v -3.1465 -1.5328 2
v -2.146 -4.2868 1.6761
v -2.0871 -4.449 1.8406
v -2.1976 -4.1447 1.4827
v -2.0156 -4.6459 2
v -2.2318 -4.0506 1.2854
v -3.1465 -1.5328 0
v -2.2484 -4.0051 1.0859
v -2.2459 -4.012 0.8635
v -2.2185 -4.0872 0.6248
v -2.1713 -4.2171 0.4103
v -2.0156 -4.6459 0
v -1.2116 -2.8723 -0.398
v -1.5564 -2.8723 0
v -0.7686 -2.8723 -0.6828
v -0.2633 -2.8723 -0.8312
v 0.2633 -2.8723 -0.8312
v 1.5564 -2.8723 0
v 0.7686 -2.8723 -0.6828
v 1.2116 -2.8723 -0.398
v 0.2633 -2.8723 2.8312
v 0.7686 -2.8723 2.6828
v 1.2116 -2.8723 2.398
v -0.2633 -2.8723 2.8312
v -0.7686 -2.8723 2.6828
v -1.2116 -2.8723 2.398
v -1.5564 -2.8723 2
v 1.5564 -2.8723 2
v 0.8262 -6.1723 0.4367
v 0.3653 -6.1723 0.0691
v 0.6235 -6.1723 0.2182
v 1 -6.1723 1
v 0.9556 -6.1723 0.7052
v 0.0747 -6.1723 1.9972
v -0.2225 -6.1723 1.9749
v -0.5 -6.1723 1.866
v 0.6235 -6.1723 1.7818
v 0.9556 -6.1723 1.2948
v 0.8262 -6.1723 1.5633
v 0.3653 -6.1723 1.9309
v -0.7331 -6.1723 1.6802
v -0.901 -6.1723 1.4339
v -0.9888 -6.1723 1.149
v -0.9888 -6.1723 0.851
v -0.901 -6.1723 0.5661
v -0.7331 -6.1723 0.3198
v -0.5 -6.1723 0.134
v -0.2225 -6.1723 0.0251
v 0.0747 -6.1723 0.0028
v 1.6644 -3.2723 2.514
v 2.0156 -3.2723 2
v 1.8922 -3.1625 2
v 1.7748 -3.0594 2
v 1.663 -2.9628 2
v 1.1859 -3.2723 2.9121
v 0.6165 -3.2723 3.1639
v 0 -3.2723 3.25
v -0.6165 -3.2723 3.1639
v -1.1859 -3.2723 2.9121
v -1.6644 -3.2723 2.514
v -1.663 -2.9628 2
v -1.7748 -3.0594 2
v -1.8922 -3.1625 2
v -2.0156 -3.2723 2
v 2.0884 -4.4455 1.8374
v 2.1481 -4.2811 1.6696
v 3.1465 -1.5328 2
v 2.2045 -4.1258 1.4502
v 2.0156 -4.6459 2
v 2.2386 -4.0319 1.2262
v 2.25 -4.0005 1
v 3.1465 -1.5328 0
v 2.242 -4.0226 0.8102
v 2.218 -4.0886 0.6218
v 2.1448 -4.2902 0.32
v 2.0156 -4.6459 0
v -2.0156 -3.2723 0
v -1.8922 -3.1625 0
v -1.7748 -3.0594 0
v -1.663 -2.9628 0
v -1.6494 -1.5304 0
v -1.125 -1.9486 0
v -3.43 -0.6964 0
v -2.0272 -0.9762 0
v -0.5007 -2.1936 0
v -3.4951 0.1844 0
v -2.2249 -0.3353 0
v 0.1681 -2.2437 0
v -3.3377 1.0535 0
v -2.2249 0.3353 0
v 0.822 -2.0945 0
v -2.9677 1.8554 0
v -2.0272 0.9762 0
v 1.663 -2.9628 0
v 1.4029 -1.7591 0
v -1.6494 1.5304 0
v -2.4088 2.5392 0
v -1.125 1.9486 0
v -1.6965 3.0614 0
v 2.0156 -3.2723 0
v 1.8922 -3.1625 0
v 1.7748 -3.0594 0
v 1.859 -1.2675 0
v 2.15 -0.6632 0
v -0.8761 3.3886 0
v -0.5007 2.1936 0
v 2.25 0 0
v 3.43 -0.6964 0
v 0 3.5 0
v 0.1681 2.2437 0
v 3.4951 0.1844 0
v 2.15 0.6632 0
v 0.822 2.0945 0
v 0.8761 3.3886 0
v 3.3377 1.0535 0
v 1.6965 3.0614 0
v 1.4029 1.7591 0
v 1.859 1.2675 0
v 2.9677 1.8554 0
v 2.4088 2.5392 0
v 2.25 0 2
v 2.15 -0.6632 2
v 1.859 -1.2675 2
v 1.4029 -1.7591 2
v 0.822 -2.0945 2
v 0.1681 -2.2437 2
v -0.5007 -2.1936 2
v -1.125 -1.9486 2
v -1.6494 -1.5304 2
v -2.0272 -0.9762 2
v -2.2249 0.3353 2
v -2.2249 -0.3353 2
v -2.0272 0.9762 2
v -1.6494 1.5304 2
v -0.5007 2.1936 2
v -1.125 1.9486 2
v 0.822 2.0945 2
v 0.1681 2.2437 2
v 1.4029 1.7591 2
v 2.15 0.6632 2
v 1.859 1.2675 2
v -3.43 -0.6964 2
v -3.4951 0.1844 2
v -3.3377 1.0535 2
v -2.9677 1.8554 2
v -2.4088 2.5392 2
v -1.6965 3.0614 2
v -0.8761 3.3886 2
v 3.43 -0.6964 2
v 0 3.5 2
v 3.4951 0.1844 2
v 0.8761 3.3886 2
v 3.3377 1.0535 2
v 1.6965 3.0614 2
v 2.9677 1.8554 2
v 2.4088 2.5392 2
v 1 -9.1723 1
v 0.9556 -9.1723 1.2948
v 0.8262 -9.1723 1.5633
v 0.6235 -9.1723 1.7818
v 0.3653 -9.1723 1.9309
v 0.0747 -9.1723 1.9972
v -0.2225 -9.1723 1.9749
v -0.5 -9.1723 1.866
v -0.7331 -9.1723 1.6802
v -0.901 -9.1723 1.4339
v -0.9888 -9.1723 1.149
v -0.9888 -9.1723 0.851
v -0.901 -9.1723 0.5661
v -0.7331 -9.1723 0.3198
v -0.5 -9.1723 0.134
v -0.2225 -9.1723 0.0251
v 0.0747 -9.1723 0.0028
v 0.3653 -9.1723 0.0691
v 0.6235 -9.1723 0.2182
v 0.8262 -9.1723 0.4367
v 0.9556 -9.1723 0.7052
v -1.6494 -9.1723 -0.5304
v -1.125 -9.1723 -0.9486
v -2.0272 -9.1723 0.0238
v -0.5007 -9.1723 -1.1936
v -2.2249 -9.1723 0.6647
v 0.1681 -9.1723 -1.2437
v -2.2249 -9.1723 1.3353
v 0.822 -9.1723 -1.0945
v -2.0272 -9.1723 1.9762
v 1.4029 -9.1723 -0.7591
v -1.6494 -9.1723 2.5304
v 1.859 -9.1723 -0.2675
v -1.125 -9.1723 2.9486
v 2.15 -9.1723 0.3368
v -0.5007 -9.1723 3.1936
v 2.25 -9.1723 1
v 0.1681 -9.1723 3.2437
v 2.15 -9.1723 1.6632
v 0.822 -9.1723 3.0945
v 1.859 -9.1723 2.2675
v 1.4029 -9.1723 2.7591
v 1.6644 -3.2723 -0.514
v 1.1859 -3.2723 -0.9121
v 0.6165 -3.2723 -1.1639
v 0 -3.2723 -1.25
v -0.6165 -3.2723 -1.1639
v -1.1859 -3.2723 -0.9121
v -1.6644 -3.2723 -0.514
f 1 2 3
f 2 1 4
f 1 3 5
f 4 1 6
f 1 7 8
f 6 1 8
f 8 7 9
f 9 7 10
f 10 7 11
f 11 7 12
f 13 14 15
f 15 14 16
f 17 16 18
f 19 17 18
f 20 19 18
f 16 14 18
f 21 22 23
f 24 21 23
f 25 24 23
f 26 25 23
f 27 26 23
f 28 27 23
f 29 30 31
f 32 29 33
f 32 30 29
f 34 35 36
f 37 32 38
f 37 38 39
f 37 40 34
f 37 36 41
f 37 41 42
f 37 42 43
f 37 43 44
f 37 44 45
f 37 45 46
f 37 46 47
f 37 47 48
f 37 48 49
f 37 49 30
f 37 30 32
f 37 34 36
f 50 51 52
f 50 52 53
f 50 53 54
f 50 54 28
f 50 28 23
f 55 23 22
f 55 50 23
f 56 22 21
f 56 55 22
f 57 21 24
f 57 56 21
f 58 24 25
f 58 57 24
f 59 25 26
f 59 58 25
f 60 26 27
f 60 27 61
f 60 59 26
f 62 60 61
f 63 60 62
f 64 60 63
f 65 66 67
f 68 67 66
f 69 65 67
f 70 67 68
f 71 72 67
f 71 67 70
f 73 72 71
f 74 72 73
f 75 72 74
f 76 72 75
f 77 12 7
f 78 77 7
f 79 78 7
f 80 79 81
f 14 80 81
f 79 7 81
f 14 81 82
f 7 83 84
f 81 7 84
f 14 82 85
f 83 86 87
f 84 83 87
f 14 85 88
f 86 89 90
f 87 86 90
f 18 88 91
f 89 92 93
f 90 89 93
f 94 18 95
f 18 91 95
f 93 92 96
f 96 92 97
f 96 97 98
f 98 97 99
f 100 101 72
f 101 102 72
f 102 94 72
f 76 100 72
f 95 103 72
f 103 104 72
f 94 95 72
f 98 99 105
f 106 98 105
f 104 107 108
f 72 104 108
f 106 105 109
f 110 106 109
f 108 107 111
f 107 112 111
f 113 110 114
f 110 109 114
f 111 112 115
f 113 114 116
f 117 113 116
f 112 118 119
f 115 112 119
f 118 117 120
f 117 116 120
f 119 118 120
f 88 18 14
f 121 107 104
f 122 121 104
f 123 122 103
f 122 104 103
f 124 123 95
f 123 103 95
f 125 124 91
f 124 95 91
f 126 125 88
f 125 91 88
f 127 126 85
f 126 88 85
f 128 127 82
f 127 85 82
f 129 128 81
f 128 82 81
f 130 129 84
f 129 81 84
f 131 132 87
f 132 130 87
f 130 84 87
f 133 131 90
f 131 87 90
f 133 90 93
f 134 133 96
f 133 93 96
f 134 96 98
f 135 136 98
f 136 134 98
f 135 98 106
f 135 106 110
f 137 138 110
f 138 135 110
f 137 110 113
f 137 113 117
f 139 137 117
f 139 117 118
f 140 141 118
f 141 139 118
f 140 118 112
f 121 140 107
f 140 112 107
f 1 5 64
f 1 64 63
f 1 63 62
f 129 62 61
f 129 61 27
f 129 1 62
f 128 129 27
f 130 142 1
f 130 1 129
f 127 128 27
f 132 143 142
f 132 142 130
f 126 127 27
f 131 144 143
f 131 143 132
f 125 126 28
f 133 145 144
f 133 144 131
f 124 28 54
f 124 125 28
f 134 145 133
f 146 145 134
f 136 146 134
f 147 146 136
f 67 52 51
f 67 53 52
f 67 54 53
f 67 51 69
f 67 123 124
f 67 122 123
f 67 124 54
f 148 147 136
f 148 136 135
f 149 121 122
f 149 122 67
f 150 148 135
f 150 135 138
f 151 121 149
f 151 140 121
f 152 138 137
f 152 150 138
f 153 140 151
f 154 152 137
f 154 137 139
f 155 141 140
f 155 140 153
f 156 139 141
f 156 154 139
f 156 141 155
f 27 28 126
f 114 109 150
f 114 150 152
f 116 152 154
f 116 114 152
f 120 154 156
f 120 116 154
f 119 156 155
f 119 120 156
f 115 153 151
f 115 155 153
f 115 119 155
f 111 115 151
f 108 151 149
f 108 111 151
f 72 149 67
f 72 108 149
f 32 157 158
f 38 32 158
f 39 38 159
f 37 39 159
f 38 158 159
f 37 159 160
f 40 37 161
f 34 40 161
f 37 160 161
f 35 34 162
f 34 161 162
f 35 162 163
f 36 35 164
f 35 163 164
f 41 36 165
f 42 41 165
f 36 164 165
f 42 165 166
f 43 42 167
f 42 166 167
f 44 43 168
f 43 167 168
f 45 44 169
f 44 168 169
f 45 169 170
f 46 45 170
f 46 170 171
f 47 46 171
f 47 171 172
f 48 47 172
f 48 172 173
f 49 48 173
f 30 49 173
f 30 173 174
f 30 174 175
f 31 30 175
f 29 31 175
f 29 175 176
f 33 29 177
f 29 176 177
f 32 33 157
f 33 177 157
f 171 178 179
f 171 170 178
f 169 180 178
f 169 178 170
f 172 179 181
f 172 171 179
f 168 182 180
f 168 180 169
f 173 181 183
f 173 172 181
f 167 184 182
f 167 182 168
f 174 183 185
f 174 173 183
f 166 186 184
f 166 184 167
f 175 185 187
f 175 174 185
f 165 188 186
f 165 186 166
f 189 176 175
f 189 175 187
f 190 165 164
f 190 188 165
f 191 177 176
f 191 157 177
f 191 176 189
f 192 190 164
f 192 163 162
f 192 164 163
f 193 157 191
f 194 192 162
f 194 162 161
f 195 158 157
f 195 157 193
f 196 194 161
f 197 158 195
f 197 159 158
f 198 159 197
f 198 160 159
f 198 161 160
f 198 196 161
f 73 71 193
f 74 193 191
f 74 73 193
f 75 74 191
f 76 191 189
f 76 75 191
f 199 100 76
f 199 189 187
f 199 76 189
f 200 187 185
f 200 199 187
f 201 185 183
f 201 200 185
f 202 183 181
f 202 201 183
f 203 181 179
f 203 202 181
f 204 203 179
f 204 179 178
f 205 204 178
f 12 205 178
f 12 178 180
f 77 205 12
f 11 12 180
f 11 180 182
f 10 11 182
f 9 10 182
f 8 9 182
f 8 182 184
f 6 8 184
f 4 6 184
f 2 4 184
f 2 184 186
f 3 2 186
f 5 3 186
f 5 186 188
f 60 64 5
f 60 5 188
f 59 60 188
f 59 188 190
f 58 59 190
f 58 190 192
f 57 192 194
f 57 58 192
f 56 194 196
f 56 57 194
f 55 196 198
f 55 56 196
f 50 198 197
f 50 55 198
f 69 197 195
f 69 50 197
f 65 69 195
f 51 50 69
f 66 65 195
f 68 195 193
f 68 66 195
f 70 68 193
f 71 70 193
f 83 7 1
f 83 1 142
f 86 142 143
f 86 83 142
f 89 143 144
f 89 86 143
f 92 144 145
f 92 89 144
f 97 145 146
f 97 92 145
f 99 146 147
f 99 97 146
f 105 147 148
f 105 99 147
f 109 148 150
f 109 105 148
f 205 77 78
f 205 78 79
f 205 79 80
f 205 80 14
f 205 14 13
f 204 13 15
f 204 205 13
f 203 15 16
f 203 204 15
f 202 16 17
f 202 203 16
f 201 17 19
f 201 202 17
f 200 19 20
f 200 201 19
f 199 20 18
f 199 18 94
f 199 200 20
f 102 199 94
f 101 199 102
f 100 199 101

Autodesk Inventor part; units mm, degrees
ref_plane "YZ Plane" through (0, 0, 0) normal (1, 0, 0) x (0, 1, 0)
ref_plane "XZ Plane" through (0, 0, 0) normal (0, 1, 0) x (-1, 0, 0)
ref_plane "XY Plane" through (0, 0, 0) normal (0, 0, 1) x (1, 0, 0)
sketch "Sketch1" plane through (0, 0, 0) normal (0, 0, 1) x (1, 0, 0)
  circle A0 centre (0, 0) radius 2.25
  line L0 (0, 0) -> (0, -9.3774) construction
  line L1 (0, -9.3774) -> (2, -9.3774) construction
  line L2 (2, -9.3774) -> (2, -2.8723) construction
  circle A1 centre (0, 0) radius 3.5 construction
  line L3 (3.1465, -1.5328) -> (2, -4.6887)
  arc A2 (3.1465, -1.5328) -> (0, 3.5) centre (0, 0) ccw
  line L4 (-3.1465, -1.5328) -> (-2, -4.6887)
  arc A3 (0, 3.5) -> (-3.1465, -1.5328) centre (0, 0) ccw
  line L5 (2, -4.6887) -> (2, -2.8723)
  line L6 (-2, -4.6887) -> (-2, -2.8723)
  line L7 (-2, -2.8723) -> (2, -2.8723)
  dimension "d1" = 4.5
  dimension "d2" = 2
  dimension "d3" = 7
extrude "Extrusion1" add sketch "Sketch1" along normal blind 2
sketch "Sketch2" plane through (-2, -2.8723, 0) normal (0, -1, 0) x (1, 0, 0)
  line L0 (4, 2) -> (0, 2) projected
  line L1 (0, 0) -> (0, 2) projected
  line L2 (0, 0) -> (4, 0) projected
  line L3 (4, 0) -> (4, 2) projected
  line L4 (0, 2) -> (4, 0) construction
  line L5 (4, 2) -> (0, 0) construction
  circle A0 centre (2, 1) radius 2.25
  point P0 (2, 0)
  dimension "d6" = 4.5
extrude "Extrusion2" add sketch "Sketch2" along normal blind 6.3 contours L3 L2 L1 L0 | A0
sketch "Sketch3" plane through (0, -9.1723, 1) normal (0, -1, 0) x (1, 0, 0)
  circle A0 centre (0, 0) radius 2.25 projected
  circle A1 centre (0, 0) radius 1
  point P0 (0, -1)
  dimension "d9" = 2
extrude "Extrusion3" cut sketch "Sketch3" against normal blind 3 contours A1
chamfer "Chamfer1" distance 0.4 angle 45 1 edges at (0, -2.8723, -1.25)
chamfer "Chamfer2" distance 0.4 angle 45 1 edges at (0, -2.8723, 3.25)
properties part number "union2"
